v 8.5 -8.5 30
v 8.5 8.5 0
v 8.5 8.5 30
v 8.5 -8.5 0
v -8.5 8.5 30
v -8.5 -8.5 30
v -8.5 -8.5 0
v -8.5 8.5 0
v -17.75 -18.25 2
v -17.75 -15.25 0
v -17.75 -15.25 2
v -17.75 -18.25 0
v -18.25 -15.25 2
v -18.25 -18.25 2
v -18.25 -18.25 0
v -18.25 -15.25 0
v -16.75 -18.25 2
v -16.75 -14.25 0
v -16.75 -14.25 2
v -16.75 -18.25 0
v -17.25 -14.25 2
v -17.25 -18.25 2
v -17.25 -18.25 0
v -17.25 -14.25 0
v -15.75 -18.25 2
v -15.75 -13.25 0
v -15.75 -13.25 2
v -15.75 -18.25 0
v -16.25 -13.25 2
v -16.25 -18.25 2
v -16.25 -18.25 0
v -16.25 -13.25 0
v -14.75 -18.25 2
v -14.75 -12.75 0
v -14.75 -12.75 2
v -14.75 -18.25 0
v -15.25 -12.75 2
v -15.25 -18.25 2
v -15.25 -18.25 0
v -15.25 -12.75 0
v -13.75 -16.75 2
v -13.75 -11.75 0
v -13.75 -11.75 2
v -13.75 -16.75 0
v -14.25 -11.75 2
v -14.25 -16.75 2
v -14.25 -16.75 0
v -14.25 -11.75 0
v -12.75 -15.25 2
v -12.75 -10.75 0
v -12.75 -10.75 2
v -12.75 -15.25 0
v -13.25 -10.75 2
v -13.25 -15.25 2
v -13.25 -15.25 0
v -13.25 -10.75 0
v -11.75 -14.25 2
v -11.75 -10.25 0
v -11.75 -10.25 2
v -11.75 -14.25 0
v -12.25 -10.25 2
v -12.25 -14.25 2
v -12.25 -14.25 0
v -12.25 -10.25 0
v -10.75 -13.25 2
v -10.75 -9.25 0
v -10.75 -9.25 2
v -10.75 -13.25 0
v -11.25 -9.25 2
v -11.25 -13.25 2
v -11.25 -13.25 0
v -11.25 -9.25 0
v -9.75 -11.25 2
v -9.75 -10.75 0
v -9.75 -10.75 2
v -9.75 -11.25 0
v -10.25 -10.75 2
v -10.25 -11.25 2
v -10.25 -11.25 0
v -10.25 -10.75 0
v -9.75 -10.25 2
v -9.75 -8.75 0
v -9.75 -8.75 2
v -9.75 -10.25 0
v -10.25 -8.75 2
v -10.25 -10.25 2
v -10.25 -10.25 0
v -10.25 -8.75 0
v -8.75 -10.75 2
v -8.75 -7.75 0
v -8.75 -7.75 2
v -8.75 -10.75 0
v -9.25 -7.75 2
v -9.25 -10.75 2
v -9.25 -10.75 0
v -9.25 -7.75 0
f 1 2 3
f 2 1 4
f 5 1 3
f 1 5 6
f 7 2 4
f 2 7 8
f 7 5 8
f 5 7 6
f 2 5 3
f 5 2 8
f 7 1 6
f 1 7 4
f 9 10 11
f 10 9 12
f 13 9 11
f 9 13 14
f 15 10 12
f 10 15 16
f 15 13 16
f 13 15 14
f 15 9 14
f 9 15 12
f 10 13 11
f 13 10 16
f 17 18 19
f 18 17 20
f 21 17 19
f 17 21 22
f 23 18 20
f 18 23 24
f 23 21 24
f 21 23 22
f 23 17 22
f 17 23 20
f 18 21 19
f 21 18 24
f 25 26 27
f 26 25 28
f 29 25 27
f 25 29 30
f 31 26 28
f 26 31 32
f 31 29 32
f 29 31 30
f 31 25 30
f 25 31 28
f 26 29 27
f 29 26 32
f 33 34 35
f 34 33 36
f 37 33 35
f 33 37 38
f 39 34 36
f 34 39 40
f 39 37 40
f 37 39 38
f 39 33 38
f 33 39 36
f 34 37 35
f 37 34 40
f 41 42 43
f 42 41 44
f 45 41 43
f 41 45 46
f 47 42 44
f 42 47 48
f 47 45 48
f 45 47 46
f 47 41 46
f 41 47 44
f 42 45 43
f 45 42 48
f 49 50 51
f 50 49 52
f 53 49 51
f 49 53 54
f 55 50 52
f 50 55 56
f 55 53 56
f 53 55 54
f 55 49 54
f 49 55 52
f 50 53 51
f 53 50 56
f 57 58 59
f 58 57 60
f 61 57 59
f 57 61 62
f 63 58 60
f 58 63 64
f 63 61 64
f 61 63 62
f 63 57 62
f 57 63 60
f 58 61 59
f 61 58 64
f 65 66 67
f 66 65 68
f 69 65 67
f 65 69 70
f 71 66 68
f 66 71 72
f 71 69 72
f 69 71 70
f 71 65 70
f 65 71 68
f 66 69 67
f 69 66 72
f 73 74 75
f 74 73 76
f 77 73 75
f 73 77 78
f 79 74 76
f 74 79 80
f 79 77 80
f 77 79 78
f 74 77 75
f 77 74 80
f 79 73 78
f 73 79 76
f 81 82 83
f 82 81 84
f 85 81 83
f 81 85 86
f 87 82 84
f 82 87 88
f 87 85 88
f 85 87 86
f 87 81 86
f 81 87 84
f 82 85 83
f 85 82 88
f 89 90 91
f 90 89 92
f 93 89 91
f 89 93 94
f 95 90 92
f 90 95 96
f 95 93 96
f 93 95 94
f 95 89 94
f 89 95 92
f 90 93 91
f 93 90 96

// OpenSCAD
translate([0, 0, 15]) color([0,1,0,0.9]) cube([17, 17, 30], center=true);
translate([-18.0, -18.0, 1]) color([1,0,0]) cube([0.5, 0.5, 2], center=true);
translate([-18.0, -17.5, 1]) color([1,0,0]) cube([0.5, 0.5, 2], center=true);
translate([-18.0, -17.0, 1]) color([1,0,0]) cube([0.5, 0.5, 2], center=true);
translate([-18.0, -16.5, 1]) color([1,0,0]) cube([0.5, 0.5, 2], center=true);
translate([-18.0, -16.0, 1]) color([1,0,0]) cube([0.5, 0.5, 2], center=true);
translate([-18.0, -15.5, 1]) color([1,0,0]) cube([0.5, 0.5, 2], center=true);
translate([-17.0, -18.0, 1]) color([1,0,0]) cube([0.5, 0.5, 2], center=true);
translate([-17.0, -17.5, 1]) color([1,0,0]) cube([0.5, 0.5, 2], center=true);
translate([-17.0, -17.0, 1]) color([1,0,0]) cube([0.5, 0.5, 2], center=true);
translate([-17.0, -16.5, 1]) color([1,0,0]) cube([0.5, 0.5, 2], center=true);
translate([-17.0, -16.0, 1]) color([1,0,0]) cube([0.5, 0.5, 2], center=true);
translate([-17.0, -15.5, 1]) color([1,0,0]) cube([0.5, 0.5, 2], center=true);
translate([-17.0, -15.0, 1]) color([1,0,0]) cube([0.5, 0.5, 2], center=true);
translate([-17.0, -14.5, 1]) color([1,0,0]) cube([0.5, 0.5, 2], center=true);
translate([-16.0, -18.0, 1]) color([1,0,0]) cube([0.5, 0.5, 2], center=true);
translate([-16.0, -17.5, 1]) color([1,0,0]) cube([0.5, 0.5, 2], center=true);
translate([-16.0, -17.0, 1]) color([1,0,0]) cube([0.5, 0.5, 2], center=true);
translate([-16.0, -16.5, 1]) color([1,0,0]) cube([0.5, 0.5, 2], center=true);
translate([-16.0, -16.0, 1]) color([1,0,0]) cube([0.5, 0.5, 2], center=true);
translate([-16.0, -15.5, 1]) color([1,0,0]) cube([0.5, 0.5, 2], center=true);
translate([-16.0, -15.0, 1]) color([1,0,0]) cube([0.5, 0.5, 2], center=true);
translate([-16.0, -14.5, 1]) color([1,0,0]) cube([0.5, 0.5, 2], center=true);
translate([-16.0, -14.0, 1]) color([1,0,0]) cube([0.5, 0.5, 2], center=true);
translate([-16.0, -13.5, 1]) color([1,0,0]) cube([0.5, 0.5, 2], center=true);
translate([-15.0, -18.0, 1]) color([1,0,0]) cube([0.5, 0.5, 2], center=true);
translate([-15.0, -17.5, 1]) color([1,0,0]) cube([0.5, 0.5, 2], center=true);
translate([-15.0, -17.0, 1]) color([1,0,0]) cube([0.5, 0.5, 2], center=true);
translate([-15.0, -16.5, 1]) color([1,0,0]) cube([0.5, 0.5, 2], center=true);
translate([-15.0, -16.0, 1]) color([1,0,0]) cube([0.5, 0.5, 2], center=true);
translate([-15.0, -15.5, 1]) color([1,0,0]) cube([0.5, 0.5, 2], center=true);
translate([-15.0, -15.0, 1]) color([1,0,0]) cube([0.5, 0.5, 2], center=true);
translate([-15.0, -14.5, 1]) color([1,0,0]) cube([0.5, 0.5, 2], center=true);
translate([-15.0, -14.0, 1]) color([1,0,0]) cube([0.5, 0.5, 2], center=true);
translate([-15.0, -13.5, 1]) color([1,0,0]) cube([0.5, 0.5, 2], center=true);
translate([-15.0, -13.0, 1]) color([1,0,0]) cube([0.5, 0.5, 2], center=true);
translate([-14.0, -16.5, 1]) color([1,0,0]) cube([0.5, 0.5, 2], center=true);
translate([-14.0, -16.0, 1]) color([1,0,0]) cube([0.5, 0.5, 2], center=true);
translate([-14.0, -15.5, 1]) color([1,0,0]) cube([0.5, 0.5, 2], center=true);
translate([-14.0, -15.0, 1]) color([1,0,0]) cube([0.5, 0.5, 2], center=true);
translate([-14.0, -14.5, 1]) color([1,0,0]) cube([0.5, 0.5, 2], center=true);
translate([-14.0, -14.0, 1]) color([1,0,0]) cube([0.5, 0.5, 2], center=true);
translate([-14.0, -13.5, 1]) color([1,0,0]) cube([0.5, 0.5, 2], center=true);
translate([-14.0, -13.0, 1]) color([1,0,0]) cube([0.5, 0.5, 2], center=true);
translate([-14.0, -12.5, 1]) color([1,0,0]) cube([0.5, 0.5, 2], center=true);
translate([-14.0, -12.0, 1]) color([1,0,0]) cube([0.5, 0.5, 2], center=true);
translate([-13.0, -15.0, 1]) color([1,0,0]) cube([0.5, 0.5, 2], center=true);
translate([-13.0, -14.5, 1]) color([1,0,0]) cube([0.5, 0.5, 2], center=true);
translate([-13.0, -14.0, 1]) color([1,0,0]) cube([0.5, 0.5, 2], center=true);
translate([-13.0, -13.5, 1]) color([1,0,0]) cube([0.5, 0.5, 2], center=true);
translate([-13.0, -13.0, 1]) color([1,0,0]) cube([0.5, 0.5, 2], center=true);
translate([-13.0, -12.5, 1]) color([1,0,0]) cube([0.5, 0.5, 2], center=true);
translate([-13.0, -12.0, 1]) color([1,0,0]) cube([0.5, 0.5, 2], center=true);
translate([-13.0, -11.5, 1]) color([1,0,0]) cube([0.5, 0.5, 2], center=true);
translate([-13.0, -11.0, 1]) color([1,0,0]) cube([0.5, 0.5, 2], center=true);
translate([-12.0, -14.0, 1]) color([1,0,0]) cube([0.5, 0.5, 2], center=true);
translate([-12.0, -13.5, 1]) color([1,0,0]) cube([0.5, 0.5, 2], center=true);
translate([-12.0, -13.0, 1]) color([1,0,0]) cube([0.5, 0.5, 2], center=true);
translate([-12.0, -12.5, 1]) color([1,0,0]) cube([0.5, 0.5, 2], center=true);
translate([-12.0, -12.0, 1]) color([1,0,0]) cube([0.5, 0.5, 2], center=true);
translate([-12.0, -11.5, 1]) color([1,0,0]) cube([0.5, 0.5, 2], center=true);
translate([-12.0, -11.0, 1]) color([1,0,0]) cube([0.5, 0.5, 2], center=true);
translate([-12.0, -10.5, 1]) color([1,0,0]) cube([0.5, 0.5, 2], center=true);
translate([-11.0, -13.0, 1]) color([1,0,0]) cube([0.5, 0.5, 2], center=true);
translate([-11.0, -12.5, 1]) color([1,0,0]) cube([0.5, 0.5, 2], center=true);
translate([-11.0, -12.0, 1]) color([1,0,0]) cube([0.5, 0.5, 2], center=true);
translate([-11.0, -11.5, 1]) color([1,0,0]) cube([0.5, 0.5, 2], center=true);
translate([-11.0, -11.0, 1]) color([1,0,0]) cube([0.5, 0.5, 2], center=true);
translate([-11.0, -10.5, 1]) color([1,0,0]) cube([0.5, 0.5, 2], center=true);
translate([-11.0, -10.0, 1]) color([1,0,0]) cube([0.5, 0.5, 2], center=true);
translate([-11.0, -9.5, 1]) color([1,0,0]) cube([0.5, 0.5, 2], center=true);
translate([-10.0, -11.0, 1]) color([1,0,0]) cube([0.5, 0.5, 2], center=true);
translate([-10.0, -10.0, 1]) color([1,0,0]) cube([0.5, 0.5, 2], center=true);
translate([-10.0, -9.5, 1]) color([1,0,0]) cube([0.5, 0.5, 2], center=true);
translate([-10.0, -9.0, 1]) color([1,0,0]) cube([0.5, 0.5, 2], center=true);
translate([-9.0, -10.5, 1]) color([1,0,0]) cube([0.5, 0.5, 2], center=true);
translate([-9.0, -10.0, 1]) color([1,0,0]) cube([0.5, 0.5, 2], center=true);
translate([-9.0, -9.5, 1]) color([1,0,0]) cube([0.5, 0.5, 2], center=true);
translate([-9.0, -9.0, 1]) color([1,0,0]) cube([0.5, 0.5, 2], center=true);
translate([-9.0, -8.5, 1]) color([1,0,0]) cube([0.5, 0.5, 2], center=true);
translate([-9.0, -8.0, 1]) color([1,0,0]) cube([0.5, 0.5, 2], center=true);
